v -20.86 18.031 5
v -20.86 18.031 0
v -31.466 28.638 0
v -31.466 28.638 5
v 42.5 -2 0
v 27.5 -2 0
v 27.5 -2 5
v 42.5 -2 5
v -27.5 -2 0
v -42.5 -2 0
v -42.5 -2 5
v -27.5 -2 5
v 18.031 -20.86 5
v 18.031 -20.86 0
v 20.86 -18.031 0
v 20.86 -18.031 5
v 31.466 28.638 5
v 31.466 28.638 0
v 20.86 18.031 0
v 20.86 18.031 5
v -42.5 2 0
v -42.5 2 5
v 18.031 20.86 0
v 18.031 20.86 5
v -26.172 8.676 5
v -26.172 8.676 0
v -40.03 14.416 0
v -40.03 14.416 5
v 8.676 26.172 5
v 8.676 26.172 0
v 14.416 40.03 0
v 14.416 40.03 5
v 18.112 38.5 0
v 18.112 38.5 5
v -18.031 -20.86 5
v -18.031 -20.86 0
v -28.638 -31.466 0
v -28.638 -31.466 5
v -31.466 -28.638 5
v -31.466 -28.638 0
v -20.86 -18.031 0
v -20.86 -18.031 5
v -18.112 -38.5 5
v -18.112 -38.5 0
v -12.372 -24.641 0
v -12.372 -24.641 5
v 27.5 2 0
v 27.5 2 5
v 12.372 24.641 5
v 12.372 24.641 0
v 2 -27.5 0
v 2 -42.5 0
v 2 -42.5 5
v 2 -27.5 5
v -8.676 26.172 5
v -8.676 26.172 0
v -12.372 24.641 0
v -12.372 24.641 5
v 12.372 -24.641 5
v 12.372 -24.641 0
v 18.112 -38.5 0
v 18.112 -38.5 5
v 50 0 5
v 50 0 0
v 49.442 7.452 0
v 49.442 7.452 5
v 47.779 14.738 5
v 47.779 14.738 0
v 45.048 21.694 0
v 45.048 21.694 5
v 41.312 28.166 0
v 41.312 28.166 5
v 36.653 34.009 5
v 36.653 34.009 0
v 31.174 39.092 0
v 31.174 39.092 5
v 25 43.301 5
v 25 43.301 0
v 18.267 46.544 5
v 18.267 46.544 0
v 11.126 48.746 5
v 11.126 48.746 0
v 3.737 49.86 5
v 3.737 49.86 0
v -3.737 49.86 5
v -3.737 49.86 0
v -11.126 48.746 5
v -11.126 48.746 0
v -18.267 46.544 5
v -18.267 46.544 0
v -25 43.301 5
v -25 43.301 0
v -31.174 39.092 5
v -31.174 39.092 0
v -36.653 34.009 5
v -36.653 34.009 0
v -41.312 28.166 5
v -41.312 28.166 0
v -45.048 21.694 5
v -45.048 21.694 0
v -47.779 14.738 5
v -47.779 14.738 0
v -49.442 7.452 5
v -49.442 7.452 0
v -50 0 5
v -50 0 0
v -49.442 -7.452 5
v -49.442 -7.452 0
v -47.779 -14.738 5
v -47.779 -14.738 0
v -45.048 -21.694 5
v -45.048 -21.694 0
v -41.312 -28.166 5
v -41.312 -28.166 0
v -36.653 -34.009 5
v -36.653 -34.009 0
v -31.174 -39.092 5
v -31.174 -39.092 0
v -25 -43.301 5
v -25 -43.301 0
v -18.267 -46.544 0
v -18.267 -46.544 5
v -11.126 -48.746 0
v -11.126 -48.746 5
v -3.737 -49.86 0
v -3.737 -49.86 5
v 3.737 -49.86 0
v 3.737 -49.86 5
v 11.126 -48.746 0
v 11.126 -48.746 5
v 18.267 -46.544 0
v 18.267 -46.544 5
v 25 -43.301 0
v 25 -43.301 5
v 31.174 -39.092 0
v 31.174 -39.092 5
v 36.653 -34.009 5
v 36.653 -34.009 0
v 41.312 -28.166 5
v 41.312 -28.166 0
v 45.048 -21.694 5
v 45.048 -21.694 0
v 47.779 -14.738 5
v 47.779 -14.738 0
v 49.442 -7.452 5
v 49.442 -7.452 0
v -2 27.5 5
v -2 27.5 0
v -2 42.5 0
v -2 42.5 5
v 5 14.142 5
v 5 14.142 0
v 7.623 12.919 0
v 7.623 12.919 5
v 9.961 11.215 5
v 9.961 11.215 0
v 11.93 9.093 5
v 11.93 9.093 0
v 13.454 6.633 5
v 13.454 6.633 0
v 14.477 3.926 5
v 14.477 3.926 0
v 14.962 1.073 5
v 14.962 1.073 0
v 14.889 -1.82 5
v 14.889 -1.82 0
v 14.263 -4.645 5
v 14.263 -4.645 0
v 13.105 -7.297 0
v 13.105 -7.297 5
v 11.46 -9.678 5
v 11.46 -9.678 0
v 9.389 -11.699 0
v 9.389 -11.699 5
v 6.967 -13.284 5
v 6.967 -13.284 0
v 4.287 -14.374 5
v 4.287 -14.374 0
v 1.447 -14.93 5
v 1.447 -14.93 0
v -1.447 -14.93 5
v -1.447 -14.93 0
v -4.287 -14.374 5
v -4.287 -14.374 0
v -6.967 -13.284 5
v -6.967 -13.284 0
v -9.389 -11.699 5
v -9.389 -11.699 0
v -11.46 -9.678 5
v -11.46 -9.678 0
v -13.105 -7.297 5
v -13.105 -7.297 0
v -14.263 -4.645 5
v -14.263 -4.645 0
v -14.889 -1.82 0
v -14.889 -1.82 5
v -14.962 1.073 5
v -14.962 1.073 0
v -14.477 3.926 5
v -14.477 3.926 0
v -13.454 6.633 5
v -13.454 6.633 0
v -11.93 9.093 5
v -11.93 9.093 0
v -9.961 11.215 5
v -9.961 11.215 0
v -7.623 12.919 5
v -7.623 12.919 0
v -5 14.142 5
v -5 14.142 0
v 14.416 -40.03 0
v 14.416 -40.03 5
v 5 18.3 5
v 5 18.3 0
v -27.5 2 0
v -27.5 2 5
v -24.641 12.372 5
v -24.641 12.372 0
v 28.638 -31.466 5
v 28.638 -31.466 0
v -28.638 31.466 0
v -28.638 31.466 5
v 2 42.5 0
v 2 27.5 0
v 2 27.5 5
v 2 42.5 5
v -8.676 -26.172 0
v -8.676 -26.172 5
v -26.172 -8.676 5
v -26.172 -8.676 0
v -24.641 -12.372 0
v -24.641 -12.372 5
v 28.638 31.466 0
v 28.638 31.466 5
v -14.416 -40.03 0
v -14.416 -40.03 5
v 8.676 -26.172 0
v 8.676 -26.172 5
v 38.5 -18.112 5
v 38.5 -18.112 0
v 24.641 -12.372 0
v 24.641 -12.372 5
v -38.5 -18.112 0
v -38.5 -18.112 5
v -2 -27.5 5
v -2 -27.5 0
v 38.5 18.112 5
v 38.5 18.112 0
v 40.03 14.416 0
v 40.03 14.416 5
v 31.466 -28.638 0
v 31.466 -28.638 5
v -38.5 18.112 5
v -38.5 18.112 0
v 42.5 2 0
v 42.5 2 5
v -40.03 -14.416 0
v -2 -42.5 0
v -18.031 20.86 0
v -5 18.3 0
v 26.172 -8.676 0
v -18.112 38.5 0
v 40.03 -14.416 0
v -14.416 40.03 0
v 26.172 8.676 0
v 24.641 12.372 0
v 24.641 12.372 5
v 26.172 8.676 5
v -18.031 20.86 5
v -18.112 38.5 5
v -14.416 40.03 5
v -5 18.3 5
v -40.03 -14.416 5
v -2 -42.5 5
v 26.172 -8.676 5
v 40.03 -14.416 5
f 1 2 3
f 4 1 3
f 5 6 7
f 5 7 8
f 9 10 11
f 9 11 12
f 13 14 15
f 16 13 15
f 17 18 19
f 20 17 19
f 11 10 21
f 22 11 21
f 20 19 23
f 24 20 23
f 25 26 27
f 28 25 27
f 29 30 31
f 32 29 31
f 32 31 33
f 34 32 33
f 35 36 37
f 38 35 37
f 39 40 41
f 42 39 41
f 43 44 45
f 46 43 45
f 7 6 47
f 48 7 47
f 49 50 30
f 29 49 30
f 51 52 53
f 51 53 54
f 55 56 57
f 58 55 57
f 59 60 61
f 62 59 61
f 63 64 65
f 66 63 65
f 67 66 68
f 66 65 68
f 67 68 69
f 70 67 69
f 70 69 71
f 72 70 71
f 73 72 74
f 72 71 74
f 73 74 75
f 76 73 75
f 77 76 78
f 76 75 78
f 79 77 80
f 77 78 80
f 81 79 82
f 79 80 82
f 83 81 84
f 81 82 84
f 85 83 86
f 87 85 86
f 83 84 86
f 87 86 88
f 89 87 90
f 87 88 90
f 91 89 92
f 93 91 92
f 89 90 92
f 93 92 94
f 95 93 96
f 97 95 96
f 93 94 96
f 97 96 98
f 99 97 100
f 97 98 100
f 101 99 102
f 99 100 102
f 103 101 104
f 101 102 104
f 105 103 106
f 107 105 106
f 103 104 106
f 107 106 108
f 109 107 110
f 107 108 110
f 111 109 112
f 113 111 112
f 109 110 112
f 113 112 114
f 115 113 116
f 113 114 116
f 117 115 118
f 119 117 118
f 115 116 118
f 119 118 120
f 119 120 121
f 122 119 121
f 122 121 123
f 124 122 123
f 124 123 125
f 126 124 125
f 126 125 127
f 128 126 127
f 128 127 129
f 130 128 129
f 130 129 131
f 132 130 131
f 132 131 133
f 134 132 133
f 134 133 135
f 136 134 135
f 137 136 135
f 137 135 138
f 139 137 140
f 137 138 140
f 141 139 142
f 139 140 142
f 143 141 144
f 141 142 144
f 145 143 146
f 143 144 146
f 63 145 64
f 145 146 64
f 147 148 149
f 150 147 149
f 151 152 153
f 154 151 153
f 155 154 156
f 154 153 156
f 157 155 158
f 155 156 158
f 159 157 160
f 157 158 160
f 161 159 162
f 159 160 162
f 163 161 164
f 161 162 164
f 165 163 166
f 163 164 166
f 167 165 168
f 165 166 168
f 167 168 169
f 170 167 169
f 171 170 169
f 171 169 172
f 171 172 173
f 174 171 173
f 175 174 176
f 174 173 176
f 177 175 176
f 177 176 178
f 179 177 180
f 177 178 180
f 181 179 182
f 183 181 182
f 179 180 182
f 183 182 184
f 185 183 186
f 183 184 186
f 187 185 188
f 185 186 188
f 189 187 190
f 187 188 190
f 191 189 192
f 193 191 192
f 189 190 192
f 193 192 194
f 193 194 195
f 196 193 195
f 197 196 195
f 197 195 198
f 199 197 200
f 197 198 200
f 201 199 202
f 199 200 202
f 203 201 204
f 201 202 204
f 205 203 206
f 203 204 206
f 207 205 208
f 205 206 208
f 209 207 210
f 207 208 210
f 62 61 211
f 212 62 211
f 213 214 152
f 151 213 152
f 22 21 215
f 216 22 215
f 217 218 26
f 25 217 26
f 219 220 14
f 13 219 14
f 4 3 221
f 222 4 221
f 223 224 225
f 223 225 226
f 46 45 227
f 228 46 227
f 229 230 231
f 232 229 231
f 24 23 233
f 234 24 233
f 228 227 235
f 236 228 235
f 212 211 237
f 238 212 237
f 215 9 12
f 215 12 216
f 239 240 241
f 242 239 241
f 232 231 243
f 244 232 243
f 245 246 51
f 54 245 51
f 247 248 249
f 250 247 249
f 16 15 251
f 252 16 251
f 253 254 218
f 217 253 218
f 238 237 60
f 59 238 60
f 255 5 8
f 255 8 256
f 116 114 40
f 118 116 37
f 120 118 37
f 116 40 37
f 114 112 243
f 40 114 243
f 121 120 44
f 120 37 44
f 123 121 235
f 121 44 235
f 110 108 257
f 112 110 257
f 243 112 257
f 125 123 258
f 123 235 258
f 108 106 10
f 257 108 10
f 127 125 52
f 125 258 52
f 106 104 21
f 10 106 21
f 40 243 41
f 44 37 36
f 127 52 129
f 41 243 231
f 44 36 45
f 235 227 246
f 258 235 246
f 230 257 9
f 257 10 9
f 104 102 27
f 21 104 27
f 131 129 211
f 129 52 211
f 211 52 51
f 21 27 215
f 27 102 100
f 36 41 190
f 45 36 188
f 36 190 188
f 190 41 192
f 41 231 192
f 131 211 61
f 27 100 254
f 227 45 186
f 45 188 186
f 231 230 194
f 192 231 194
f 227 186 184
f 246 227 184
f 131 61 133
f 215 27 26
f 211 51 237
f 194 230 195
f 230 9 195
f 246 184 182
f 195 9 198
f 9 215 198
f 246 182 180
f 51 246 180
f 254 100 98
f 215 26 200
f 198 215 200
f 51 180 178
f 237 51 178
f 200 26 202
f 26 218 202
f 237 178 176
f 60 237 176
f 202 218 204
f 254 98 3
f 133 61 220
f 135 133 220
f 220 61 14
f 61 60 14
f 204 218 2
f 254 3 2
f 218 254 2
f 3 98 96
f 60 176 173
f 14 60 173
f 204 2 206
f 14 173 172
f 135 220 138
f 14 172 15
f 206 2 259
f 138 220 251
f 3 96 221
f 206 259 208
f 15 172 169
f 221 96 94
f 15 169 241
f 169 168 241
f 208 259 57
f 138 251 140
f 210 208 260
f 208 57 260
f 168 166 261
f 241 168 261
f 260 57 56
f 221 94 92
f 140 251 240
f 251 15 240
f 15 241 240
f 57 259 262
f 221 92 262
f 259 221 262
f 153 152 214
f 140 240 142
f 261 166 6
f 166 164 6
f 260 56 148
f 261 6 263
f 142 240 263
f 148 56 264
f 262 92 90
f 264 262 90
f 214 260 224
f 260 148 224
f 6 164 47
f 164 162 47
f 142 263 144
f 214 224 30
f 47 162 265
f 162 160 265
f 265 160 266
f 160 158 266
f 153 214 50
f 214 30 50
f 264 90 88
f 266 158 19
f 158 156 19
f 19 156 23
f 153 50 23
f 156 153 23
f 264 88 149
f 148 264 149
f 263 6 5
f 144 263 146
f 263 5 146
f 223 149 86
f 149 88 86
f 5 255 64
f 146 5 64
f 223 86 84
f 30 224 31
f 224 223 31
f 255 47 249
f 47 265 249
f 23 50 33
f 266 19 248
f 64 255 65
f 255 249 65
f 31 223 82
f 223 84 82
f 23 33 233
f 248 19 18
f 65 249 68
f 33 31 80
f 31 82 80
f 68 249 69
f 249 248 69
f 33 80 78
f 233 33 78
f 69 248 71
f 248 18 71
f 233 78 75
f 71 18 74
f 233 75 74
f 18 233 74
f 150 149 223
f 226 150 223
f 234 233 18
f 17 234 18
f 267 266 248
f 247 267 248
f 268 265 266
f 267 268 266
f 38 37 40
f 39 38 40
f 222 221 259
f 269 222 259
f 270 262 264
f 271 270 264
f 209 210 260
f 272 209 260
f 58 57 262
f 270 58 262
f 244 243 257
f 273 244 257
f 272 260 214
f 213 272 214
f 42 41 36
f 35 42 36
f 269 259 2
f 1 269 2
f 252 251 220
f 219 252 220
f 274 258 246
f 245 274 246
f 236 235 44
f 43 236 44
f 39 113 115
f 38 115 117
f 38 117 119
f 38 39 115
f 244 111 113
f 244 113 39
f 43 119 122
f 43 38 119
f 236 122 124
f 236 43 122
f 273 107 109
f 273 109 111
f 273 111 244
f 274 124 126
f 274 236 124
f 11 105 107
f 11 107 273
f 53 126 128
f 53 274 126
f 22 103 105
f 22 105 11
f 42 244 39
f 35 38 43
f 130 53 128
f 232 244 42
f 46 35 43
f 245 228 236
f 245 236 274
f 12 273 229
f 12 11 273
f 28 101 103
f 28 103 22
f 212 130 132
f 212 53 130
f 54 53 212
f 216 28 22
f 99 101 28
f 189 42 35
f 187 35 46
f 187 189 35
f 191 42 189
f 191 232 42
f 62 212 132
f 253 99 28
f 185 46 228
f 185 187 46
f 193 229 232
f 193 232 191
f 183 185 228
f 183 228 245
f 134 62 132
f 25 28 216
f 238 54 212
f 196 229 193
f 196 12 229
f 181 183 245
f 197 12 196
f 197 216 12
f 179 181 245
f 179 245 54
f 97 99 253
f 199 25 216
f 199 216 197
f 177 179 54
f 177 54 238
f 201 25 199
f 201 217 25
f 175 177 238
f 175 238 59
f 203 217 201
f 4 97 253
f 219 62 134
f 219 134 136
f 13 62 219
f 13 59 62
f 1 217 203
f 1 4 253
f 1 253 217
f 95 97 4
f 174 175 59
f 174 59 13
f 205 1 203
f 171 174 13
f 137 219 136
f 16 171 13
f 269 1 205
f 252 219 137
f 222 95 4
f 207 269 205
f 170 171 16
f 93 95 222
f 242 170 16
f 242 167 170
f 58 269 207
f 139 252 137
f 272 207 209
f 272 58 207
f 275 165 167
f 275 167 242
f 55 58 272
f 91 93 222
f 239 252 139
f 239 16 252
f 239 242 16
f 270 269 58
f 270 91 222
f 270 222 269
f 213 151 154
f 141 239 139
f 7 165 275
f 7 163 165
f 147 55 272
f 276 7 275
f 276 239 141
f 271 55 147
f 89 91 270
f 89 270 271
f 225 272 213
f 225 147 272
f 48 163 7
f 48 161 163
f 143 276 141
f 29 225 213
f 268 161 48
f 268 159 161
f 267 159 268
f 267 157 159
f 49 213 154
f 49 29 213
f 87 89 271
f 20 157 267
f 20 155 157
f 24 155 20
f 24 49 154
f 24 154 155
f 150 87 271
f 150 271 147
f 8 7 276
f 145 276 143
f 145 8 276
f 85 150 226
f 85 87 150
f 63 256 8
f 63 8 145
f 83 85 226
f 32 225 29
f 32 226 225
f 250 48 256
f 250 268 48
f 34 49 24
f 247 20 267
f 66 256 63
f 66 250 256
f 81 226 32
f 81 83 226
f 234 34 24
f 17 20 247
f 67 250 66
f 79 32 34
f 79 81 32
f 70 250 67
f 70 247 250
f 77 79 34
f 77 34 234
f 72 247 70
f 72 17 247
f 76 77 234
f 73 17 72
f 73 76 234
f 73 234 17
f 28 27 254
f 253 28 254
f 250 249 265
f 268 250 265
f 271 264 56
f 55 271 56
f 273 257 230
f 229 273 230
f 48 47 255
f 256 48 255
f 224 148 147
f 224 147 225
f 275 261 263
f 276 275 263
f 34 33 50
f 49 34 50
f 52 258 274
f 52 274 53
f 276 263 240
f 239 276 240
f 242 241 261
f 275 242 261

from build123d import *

# Parameters (mm, degrees)
SKETCH1_R           = 50
SKETCH1_W           = 15
SKETCH1_H           = 4
SKETCH1_W_2         = 4
SKETCH1_H_2         = 15
BOSS_EXTRUDE1_DEPTH = 5


with BuildPart() as part:
    # Sketch1 → Boss-Extrude1 (new body)
    with BuildSketch(Plane.XY):
        Circle(SKETCH1_R)
        with BuildLine():
            Line((-5, 14.142135624), (-5, 18.3))
            Line((-5, 18.3), (5, 18.3))
            Line((5, 18.3), (5, 14.142135624))
            ThreePointArc((5, 14.142135624), (0, -15), (-5, 14.142135624))
        make_face(mode=Mode.SUBTRACT)
        with Locations((-35, 0)):
            Rectangle(SKETCH1_W, SKETCH1_H, mode=Mode.SUBTRACT)
        Polygon((-38.499513267, 18.111804941), (-24.641320279, 12.371553455), (-26.172054009, 8.676035325), (-40.030246996, 14.41628681), align=None, mode=Mode.SUBTRACT)
        Polygon((-28.637824638, 31.466251763), (-18.03122292, 20.859650045), (-20.859650045, 18.03122292), (-31.466251763, 28.637824638), align=None, mode=Mode.SUBTRACT)
        Polygon((-14.41628681, 40.030246996), (-8.676035325, 26.172054009), (-12.371553455, 24.641320279), (-18.111804941, 38.499513267), align=None, mode=Mode.SUBTRACT)
        with Locations((0, 35)):
            Rectangle(SKETCH1_W_2, SKETCH1_H_2, mode=Mode.SUBTRACT)
        Polygon((18.111804941, 38.499513267), (12.371553455, 24.641320279), (8.676035325, 26.172054009), (14.41628681, 40.030246996), align=None, mode=Mode.SUBTRACT)
        Polygon((31.466251763, 28.637824638), (20.859650045, 18.03122292), (18.03122292, 20.859650045), (28.637824638, 31.466251763), align=None, mode=Mode.SUBTRACT)
        Polygon((40.030246996, 14.41628681), (26.172054009, 8.676035325), (24.641320279, 12.371553455), (38.499513267, 18.111804941), align=None, mode=Mode.SUBTRACT)
        with Locations((35, 0)):
            Rectangle(SKETCH1_W, SKETCH1_H, mode=Mode.SUBTRACT)
        Polygon((38.499513267, -18.111804941), (24.641320279, -12.371553455), (26.172054009, -8.676035325), (40.030246996, -14.41628681), align=None, mode=Mode.SUBTRACT)
        Polygon((28.637824638, -31.466251763), (18.03122292, -20.859650045), (20.859650045, -18.03122292), (31.466251763, -28.637824638), align=None, mode=Mode.SUBTRACT)
        Polygon((14.41628681, -40.030246996), (8.676035325, -26.172054009), (12.371553455, -24.641320279), (18.111804941, -38.499513267), align=None, mode=Mode.SUBTRACT)
        with Locations((0, -35)):
            Rectangle(SKETCH1_W_2, SKETCH1_H_2, mode=Mode.SUBTRACT)
        Polygon((-18.111804941, -38.499513267), (-12.371553455, -24.641320279), (-8.676035325, -26.172054009), (-14.41628681, -40.030246996), align=None, mode=Mode.SUBTRACT)
        Polygon((-31.466251763, -28.637824638), (-20.859650045, -18.03122292), (-18.03122292, -20.859650045), (-28.637824638, -31.466251763), align=None, mode=Mode.SUBTRACT)
        Polygon((-40.030246996, -14.41628681), (-26.172054009, -8.676035325), (-24.641320279, -12.371553455), (-38.499513267, -18.111804941), align=None, mode=Mode.SUBTRACT)
    extrude(amount=BOSS_EXTRUDE1_DEPTH)


solid = part.part
